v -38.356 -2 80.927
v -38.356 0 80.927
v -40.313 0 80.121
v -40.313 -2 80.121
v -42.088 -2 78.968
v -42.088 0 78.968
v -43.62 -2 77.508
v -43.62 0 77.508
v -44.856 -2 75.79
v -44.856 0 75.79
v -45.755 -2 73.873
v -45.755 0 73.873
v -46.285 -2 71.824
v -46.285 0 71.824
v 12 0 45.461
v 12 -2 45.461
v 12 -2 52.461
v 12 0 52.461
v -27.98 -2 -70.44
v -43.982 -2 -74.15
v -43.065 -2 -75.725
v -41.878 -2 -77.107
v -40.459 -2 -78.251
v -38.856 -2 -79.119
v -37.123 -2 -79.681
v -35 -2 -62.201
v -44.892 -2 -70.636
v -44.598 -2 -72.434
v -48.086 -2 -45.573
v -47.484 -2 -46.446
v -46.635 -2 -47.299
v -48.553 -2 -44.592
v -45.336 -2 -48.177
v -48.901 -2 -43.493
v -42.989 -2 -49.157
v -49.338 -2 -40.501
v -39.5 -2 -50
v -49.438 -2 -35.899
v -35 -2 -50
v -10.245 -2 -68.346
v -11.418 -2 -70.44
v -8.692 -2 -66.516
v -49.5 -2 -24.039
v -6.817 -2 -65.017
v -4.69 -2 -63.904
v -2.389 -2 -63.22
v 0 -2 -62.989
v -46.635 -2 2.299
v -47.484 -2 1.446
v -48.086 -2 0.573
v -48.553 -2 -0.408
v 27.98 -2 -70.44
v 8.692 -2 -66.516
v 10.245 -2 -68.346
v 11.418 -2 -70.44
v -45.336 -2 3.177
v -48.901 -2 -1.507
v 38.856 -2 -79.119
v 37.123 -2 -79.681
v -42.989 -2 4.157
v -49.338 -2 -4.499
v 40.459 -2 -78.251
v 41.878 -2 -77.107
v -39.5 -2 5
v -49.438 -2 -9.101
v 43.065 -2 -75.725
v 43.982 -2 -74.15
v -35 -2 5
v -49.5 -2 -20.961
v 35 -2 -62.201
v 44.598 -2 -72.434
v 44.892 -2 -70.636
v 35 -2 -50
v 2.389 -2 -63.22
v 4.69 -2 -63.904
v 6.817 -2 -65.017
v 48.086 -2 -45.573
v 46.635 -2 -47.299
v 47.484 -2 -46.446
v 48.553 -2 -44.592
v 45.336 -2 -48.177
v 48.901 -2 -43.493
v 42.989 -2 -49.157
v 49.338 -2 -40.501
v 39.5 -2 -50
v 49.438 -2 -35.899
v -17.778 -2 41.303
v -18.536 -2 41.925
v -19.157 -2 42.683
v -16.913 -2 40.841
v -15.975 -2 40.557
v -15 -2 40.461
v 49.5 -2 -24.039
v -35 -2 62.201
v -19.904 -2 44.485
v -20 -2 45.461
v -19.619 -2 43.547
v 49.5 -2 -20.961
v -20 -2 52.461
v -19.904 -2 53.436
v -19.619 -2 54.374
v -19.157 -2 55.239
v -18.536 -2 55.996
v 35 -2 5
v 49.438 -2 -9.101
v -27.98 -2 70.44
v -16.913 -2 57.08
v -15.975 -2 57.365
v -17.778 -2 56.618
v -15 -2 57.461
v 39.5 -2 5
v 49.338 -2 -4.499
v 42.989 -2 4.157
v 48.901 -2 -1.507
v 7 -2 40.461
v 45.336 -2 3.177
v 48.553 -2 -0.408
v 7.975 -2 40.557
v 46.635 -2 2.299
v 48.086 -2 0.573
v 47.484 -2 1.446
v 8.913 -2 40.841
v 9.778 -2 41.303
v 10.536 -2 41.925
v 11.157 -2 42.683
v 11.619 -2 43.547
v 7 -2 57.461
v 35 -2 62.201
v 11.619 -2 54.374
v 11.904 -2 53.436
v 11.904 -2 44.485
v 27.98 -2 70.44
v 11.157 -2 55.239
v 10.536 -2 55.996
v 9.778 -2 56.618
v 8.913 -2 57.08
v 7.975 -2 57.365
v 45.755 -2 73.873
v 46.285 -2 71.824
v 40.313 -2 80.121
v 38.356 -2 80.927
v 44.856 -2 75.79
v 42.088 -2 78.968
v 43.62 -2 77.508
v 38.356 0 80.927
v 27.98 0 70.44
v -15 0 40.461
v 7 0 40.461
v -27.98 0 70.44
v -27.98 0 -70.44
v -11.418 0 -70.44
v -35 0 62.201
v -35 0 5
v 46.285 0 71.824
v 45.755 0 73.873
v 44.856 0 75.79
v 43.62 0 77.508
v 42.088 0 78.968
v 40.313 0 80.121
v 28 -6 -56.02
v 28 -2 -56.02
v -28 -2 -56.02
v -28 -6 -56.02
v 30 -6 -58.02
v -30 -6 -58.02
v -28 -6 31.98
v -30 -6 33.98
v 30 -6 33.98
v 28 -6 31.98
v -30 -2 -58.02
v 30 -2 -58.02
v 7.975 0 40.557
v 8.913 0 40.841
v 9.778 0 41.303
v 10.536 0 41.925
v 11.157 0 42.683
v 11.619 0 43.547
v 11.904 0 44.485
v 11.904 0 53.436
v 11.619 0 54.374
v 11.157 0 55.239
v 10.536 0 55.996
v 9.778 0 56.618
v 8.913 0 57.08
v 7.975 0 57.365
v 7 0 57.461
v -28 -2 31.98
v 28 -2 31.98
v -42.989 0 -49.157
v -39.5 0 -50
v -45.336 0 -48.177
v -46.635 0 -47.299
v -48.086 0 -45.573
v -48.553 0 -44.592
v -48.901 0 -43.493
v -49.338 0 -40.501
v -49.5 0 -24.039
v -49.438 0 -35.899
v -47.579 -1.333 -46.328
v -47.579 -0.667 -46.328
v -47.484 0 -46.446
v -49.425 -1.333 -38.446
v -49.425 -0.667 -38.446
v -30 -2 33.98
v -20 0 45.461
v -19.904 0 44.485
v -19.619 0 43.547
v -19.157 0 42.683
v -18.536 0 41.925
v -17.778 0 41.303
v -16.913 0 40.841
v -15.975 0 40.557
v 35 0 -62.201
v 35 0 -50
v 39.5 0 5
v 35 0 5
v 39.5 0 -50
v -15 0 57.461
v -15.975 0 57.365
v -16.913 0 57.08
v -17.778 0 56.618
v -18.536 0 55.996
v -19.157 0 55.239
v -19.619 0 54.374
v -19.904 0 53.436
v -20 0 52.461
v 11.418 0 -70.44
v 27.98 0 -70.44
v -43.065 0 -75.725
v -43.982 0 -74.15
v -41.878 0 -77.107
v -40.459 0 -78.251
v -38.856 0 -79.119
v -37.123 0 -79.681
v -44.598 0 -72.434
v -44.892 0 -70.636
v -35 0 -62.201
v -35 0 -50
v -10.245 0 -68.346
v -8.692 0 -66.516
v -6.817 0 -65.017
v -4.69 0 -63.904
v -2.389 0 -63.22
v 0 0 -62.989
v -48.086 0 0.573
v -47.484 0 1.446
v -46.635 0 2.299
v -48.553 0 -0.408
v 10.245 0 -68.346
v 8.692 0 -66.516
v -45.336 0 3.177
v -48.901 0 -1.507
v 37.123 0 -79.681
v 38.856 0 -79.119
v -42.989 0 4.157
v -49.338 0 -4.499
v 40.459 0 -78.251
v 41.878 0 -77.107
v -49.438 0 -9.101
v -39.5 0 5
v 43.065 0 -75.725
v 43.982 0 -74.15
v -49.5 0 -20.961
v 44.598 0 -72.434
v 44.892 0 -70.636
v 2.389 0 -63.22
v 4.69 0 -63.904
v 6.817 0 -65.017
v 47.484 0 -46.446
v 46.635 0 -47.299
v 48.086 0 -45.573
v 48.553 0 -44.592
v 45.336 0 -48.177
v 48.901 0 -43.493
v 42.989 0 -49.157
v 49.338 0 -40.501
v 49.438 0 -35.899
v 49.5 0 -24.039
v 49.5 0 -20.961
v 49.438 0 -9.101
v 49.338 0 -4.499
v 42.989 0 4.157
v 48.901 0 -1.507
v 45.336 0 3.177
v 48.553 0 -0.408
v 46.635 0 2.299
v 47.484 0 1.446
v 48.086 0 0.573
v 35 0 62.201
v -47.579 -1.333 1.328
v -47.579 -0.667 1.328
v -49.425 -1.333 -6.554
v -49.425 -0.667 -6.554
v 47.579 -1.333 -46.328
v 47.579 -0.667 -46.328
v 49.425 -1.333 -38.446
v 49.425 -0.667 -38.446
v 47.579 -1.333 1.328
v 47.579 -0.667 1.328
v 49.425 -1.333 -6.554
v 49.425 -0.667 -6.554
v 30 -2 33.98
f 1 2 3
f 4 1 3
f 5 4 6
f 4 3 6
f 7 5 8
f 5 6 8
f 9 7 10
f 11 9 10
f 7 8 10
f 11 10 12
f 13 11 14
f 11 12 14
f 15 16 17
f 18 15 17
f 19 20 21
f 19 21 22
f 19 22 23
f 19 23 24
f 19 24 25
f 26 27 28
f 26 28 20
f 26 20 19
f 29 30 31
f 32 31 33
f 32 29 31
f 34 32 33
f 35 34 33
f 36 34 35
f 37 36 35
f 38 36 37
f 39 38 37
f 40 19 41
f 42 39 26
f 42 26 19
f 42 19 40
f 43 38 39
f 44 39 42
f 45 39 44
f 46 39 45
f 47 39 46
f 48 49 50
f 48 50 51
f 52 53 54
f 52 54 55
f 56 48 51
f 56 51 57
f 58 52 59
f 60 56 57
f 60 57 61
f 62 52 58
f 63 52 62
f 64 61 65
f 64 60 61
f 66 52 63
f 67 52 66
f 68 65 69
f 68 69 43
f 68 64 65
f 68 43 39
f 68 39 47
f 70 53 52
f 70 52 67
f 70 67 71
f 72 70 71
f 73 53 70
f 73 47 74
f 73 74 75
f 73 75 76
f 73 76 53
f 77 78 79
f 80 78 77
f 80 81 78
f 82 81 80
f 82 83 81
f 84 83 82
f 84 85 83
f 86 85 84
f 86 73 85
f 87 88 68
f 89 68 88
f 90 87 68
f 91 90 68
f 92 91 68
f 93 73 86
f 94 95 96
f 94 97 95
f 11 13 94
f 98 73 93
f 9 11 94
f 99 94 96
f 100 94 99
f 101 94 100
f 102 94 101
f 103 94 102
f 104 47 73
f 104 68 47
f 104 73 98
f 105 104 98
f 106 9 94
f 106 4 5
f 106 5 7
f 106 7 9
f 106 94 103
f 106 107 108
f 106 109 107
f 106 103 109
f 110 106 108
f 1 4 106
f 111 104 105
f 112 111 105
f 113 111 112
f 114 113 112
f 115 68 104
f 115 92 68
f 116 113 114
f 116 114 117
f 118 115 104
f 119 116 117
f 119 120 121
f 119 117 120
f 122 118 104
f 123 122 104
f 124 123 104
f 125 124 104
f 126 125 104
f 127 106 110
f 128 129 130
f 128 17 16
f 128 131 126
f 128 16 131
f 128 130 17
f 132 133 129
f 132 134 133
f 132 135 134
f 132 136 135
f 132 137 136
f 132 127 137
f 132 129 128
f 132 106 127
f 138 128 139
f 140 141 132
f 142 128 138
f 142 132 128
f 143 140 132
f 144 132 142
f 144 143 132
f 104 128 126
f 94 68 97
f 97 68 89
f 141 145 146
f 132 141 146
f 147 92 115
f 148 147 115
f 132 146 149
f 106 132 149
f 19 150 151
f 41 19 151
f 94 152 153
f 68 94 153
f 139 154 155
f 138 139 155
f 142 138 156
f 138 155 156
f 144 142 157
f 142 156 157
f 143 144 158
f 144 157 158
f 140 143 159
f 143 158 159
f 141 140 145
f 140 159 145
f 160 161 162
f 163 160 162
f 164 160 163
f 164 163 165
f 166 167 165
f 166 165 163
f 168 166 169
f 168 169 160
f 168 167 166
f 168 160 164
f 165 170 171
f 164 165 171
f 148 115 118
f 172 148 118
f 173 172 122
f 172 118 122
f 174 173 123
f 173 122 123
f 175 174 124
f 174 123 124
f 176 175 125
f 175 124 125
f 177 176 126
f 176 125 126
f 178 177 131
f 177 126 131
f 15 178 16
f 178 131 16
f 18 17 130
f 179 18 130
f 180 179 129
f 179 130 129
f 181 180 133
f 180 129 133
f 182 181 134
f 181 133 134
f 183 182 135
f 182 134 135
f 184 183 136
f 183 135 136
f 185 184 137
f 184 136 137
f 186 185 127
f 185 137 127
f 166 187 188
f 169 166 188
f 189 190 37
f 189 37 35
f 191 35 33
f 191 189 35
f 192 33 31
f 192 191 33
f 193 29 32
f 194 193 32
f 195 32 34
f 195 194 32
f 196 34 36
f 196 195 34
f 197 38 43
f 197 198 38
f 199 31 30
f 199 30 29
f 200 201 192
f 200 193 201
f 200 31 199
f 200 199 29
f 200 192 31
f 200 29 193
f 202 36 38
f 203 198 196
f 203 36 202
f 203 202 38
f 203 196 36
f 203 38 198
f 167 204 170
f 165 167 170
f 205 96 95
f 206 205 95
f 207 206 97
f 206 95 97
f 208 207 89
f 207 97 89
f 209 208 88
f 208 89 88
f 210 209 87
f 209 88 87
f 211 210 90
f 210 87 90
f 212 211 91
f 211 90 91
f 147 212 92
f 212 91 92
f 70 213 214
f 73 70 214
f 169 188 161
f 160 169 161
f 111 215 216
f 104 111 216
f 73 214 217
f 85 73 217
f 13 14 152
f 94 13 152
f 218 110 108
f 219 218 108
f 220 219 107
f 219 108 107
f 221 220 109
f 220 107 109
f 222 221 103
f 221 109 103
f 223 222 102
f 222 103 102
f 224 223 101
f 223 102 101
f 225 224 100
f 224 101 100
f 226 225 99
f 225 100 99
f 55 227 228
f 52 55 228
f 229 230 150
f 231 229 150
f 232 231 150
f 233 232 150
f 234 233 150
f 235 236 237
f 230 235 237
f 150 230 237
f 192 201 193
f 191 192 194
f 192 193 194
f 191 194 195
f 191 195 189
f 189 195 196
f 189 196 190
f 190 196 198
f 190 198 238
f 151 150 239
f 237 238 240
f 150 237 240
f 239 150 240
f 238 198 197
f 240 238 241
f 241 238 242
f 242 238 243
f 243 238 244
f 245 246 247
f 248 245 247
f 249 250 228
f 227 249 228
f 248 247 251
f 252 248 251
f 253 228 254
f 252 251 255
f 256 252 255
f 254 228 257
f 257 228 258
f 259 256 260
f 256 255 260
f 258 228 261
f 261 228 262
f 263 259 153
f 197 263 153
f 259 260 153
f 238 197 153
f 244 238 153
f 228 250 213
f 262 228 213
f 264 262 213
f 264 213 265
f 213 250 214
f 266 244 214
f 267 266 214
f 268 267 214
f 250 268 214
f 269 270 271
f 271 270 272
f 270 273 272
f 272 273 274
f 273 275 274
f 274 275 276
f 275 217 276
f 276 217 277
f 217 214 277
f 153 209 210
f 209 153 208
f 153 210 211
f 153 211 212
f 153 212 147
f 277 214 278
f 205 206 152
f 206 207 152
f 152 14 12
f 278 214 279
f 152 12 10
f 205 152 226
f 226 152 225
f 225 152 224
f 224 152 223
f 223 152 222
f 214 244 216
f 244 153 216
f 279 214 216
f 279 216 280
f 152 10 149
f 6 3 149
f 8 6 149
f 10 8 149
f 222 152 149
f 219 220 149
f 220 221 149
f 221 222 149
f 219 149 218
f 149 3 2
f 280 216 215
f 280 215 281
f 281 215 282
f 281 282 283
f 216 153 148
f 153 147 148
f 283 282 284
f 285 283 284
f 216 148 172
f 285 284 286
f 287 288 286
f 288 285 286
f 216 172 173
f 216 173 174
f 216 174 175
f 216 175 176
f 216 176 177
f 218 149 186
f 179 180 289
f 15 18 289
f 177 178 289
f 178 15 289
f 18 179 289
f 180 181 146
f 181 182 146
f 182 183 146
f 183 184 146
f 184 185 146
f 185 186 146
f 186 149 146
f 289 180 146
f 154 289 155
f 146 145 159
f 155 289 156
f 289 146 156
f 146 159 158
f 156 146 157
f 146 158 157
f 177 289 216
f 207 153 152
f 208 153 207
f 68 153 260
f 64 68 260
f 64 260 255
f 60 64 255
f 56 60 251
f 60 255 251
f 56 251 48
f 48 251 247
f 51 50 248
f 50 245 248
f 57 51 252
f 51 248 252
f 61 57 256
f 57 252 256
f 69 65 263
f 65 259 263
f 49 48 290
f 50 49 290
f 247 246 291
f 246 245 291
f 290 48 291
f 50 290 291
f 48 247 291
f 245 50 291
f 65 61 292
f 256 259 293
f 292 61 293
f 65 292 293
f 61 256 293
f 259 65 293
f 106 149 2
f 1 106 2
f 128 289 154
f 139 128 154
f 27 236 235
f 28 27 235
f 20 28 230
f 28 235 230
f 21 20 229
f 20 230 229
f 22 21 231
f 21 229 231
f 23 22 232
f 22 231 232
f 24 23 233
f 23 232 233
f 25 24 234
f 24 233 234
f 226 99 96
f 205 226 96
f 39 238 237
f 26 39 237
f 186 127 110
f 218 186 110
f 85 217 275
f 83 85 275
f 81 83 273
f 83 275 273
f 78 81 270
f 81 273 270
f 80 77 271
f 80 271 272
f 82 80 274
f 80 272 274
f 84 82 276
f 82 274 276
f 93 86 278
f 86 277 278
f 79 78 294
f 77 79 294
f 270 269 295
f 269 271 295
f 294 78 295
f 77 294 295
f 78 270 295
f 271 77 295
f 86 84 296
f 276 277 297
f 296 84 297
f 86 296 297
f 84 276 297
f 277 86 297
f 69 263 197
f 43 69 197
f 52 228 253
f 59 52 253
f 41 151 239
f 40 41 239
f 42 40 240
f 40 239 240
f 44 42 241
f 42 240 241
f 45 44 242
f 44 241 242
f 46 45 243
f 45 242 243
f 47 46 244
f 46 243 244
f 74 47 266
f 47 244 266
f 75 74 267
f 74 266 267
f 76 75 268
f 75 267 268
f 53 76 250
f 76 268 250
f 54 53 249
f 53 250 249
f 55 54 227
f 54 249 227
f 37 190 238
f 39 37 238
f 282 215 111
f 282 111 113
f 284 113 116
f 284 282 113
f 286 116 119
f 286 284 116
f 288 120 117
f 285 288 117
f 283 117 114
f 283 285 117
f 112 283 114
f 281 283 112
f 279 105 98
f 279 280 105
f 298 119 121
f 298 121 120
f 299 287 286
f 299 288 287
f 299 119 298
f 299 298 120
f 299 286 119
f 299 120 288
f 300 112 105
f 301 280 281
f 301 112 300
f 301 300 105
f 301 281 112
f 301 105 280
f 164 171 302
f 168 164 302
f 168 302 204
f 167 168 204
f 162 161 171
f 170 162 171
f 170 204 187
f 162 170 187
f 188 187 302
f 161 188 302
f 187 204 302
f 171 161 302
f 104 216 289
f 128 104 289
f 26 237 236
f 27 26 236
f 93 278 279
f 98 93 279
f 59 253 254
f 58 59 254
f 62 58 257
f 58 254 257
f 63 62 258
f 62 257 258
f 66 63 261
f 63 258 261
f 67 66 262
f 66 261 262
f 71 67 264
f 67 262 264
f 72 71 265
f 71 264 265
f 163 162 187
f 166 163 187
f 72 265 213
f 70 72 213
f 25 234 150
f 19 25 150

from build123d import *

# Parameters (mm, degrees)
F1_DEPTH = 2
F4_DEPTH = 3
F6_DEPTH = 4


# Not quite as in the source:
# - a feature names something its author has since deleted; it is built from what else it names


with BuildPart() as f1:
    # F0 (on Front) → F1 (new body)
    with BuildSketch(Plane.XZ):
        with BuildLine():
            Line((35, 5), (35, 62.2008182108))
            Line((35, 62.2008182108), (46.2846243068, 71.8236053681))
            ThreePointArc((46.2846243068, 71.8236053681), (43.6200052332, 77.5075823048), (38.3557090366, 80.9273738449))
            Line((38.3557090366, 80.9273738449), (27.9797695779, 70.4399573502))
            Line((27.9797695779, 70.4399573502), (-27.9797695779, 70.4399573502))
            Line((-27.9797695779, 70.4399573502), (-38.3557090366, 80.9273738449))
            ThreePointArc((-38.3557090366, 80.9273738449), (-43.6200052332, 77.5075823048), (-46.2846243068, 71.8236053681))
            Line((-46.2846243068, 71.8236053681), (-35, 62.2008182108))
            Line((-35, 62.2008182108), (-35, 5))
            Line((-35, 5), (-39.5, 5))
            add(Edge.make_bspline(
                [(-39.5, 5), (-52.1831149682, 2.6601287536), (-48.8236770034, -2.5189926382), (-49.5, -20.9609586745)],
                knots=[0, 0, 0, 0, 27.820341035, 27.820341035, 27.820341035, 27.820341035], degree=3))
            Line((-49.5, -20.9609586745), (-49.5, -24.0390413254))
            add(Edge.make_bspline(
                [(-39.5, -50), (-52.1831149682, -47.6601287536), (-48.8236770034, -42.4810073618), (-49.5, -24.0390413254)],
                knots=[0, 0, 0, 0, 27.820341035, 27.820341035, 27.820341035, 27.820341035], degree=3))
            Line((-39.5, -50), (-35, -50))
            Line((-35, -50), (-35, -62.2008182108))
            Line((-35, -62.2008182108), (-44.8918512807, -70.6359399196))
            ThreePointArc((-44.8918512807, -70.6359399196), (-42.5030006526, -76.443198976), (-37.1229104696, -79.6813303345))
            Line((-37.1229104696, -79.6813303345), (-27.9797695779, -70.4399573502))
            Line((-27.9797695779, -70.4399573502), (-11.4183901742, -70.4399573502))
            ThreePointArc((-11.4183901742, -70.4399573502), (0, -62.9893172158), (11.4183901742, -70.4399573502))
            Line((11.4183901742, -70.4399573502), (27.9797695779, -70.4399573502))
            Line((27.9797695779, -70.4399573502), (37.1229104696, -79.6813303345))
            ThreePointArc((37.1229104696, -79.6813303345), (42.5030006526, -76.443198976), (44.8918512807, -70.6359399196))
            Line((44.8918512807, -70.6359399196), (35, -62.2008182108))
            Line((35, -62.2008182108), (35, -50))
            Line((35, -50), (39.5, -50))
            add(Edge.make_bspline(
                [(39.5, -50), (52.1831149682, -47.6601287536), (48.8236770034, -42.4810073618), (49.5, -24.0390413254)],
                knots=[0, 0, 0, 0, 27.820341035, 27.820341035, 27.820341035, 27.820341035], degree=3))
            Line((49.5, -24.0390413254), (49.5, -20.9609586746))
            add(Edge.make_bspline(
                [(39.5, 5), (52.1831149682, 2.6601287536), (48.8236770034, -2.5189926382), (49.5, -20.9609586746)],
                knots=[0, 0, 0, 0, 27.820341035, 27.820341035, 27.820341035, 27.820341035], degree=3))
            Line((39.5, 5), (35, 5))
        make_face()
    extrude(amount=F1_DEPTH)

    # F3 (on offset) → F4 (cut)
    with BuildSketch(Plane.XZ.offset(2)):
        with BuildLine():
            ThreePointArc((12, 52.460730496), (10.5355339059, 55.9962644019), (7, 57.460730496))
            Line((7, 57.460730496), (-15, 57.460730496))
            ThreePointArc((-15, 57.460730496), (-18.5355339059, 55.9962644019), (-20, 52.460730496))
            Line((-20, 52.460730496), (-20, 45.460730496))
            ThreePointArc((-20, 45.460730496), (-18.5355339059, 41.9251965901), (-15, 40.460730496))
            Line((-15, 40.460730496), (7, 40.460730496))
            ThreePointArc((7, 40.460730496), (10.5355339059, 41.9251965901), (12, 45.460730496))
            Line((12, 45.460730496), (12, 52.460730496))
        make_face()
    extrude(amount=-F4_DEPTH, mode=Mode.SUBTRACT)


with BuildPart() as f6:
    # F5 (on offset) → F6 (new body)
    with BuildSketch(Plane.XZ.offset(2)):
        Polygon((-8.6902184412, 33.9803936929), (-30, 33.9803936929), (-30, -58.0196063071), (-8.6902184412, -58.0196063071), (30, -58.0196063071), (30, 33.9803936929), align=None)
        Polygon((-28, -56.0196063071), (-28, 31.9803936929), (-8.6902184412, 31.9803936929), (28, 31.9803936929), (28, -56.0196063071), (-8.6902184412, -56.0196063071), align=None, mode=Mode.SUBTRACT)
    extrude(amount=F6_DEPTH)


solid = Compound([f1.part, f6.part])
